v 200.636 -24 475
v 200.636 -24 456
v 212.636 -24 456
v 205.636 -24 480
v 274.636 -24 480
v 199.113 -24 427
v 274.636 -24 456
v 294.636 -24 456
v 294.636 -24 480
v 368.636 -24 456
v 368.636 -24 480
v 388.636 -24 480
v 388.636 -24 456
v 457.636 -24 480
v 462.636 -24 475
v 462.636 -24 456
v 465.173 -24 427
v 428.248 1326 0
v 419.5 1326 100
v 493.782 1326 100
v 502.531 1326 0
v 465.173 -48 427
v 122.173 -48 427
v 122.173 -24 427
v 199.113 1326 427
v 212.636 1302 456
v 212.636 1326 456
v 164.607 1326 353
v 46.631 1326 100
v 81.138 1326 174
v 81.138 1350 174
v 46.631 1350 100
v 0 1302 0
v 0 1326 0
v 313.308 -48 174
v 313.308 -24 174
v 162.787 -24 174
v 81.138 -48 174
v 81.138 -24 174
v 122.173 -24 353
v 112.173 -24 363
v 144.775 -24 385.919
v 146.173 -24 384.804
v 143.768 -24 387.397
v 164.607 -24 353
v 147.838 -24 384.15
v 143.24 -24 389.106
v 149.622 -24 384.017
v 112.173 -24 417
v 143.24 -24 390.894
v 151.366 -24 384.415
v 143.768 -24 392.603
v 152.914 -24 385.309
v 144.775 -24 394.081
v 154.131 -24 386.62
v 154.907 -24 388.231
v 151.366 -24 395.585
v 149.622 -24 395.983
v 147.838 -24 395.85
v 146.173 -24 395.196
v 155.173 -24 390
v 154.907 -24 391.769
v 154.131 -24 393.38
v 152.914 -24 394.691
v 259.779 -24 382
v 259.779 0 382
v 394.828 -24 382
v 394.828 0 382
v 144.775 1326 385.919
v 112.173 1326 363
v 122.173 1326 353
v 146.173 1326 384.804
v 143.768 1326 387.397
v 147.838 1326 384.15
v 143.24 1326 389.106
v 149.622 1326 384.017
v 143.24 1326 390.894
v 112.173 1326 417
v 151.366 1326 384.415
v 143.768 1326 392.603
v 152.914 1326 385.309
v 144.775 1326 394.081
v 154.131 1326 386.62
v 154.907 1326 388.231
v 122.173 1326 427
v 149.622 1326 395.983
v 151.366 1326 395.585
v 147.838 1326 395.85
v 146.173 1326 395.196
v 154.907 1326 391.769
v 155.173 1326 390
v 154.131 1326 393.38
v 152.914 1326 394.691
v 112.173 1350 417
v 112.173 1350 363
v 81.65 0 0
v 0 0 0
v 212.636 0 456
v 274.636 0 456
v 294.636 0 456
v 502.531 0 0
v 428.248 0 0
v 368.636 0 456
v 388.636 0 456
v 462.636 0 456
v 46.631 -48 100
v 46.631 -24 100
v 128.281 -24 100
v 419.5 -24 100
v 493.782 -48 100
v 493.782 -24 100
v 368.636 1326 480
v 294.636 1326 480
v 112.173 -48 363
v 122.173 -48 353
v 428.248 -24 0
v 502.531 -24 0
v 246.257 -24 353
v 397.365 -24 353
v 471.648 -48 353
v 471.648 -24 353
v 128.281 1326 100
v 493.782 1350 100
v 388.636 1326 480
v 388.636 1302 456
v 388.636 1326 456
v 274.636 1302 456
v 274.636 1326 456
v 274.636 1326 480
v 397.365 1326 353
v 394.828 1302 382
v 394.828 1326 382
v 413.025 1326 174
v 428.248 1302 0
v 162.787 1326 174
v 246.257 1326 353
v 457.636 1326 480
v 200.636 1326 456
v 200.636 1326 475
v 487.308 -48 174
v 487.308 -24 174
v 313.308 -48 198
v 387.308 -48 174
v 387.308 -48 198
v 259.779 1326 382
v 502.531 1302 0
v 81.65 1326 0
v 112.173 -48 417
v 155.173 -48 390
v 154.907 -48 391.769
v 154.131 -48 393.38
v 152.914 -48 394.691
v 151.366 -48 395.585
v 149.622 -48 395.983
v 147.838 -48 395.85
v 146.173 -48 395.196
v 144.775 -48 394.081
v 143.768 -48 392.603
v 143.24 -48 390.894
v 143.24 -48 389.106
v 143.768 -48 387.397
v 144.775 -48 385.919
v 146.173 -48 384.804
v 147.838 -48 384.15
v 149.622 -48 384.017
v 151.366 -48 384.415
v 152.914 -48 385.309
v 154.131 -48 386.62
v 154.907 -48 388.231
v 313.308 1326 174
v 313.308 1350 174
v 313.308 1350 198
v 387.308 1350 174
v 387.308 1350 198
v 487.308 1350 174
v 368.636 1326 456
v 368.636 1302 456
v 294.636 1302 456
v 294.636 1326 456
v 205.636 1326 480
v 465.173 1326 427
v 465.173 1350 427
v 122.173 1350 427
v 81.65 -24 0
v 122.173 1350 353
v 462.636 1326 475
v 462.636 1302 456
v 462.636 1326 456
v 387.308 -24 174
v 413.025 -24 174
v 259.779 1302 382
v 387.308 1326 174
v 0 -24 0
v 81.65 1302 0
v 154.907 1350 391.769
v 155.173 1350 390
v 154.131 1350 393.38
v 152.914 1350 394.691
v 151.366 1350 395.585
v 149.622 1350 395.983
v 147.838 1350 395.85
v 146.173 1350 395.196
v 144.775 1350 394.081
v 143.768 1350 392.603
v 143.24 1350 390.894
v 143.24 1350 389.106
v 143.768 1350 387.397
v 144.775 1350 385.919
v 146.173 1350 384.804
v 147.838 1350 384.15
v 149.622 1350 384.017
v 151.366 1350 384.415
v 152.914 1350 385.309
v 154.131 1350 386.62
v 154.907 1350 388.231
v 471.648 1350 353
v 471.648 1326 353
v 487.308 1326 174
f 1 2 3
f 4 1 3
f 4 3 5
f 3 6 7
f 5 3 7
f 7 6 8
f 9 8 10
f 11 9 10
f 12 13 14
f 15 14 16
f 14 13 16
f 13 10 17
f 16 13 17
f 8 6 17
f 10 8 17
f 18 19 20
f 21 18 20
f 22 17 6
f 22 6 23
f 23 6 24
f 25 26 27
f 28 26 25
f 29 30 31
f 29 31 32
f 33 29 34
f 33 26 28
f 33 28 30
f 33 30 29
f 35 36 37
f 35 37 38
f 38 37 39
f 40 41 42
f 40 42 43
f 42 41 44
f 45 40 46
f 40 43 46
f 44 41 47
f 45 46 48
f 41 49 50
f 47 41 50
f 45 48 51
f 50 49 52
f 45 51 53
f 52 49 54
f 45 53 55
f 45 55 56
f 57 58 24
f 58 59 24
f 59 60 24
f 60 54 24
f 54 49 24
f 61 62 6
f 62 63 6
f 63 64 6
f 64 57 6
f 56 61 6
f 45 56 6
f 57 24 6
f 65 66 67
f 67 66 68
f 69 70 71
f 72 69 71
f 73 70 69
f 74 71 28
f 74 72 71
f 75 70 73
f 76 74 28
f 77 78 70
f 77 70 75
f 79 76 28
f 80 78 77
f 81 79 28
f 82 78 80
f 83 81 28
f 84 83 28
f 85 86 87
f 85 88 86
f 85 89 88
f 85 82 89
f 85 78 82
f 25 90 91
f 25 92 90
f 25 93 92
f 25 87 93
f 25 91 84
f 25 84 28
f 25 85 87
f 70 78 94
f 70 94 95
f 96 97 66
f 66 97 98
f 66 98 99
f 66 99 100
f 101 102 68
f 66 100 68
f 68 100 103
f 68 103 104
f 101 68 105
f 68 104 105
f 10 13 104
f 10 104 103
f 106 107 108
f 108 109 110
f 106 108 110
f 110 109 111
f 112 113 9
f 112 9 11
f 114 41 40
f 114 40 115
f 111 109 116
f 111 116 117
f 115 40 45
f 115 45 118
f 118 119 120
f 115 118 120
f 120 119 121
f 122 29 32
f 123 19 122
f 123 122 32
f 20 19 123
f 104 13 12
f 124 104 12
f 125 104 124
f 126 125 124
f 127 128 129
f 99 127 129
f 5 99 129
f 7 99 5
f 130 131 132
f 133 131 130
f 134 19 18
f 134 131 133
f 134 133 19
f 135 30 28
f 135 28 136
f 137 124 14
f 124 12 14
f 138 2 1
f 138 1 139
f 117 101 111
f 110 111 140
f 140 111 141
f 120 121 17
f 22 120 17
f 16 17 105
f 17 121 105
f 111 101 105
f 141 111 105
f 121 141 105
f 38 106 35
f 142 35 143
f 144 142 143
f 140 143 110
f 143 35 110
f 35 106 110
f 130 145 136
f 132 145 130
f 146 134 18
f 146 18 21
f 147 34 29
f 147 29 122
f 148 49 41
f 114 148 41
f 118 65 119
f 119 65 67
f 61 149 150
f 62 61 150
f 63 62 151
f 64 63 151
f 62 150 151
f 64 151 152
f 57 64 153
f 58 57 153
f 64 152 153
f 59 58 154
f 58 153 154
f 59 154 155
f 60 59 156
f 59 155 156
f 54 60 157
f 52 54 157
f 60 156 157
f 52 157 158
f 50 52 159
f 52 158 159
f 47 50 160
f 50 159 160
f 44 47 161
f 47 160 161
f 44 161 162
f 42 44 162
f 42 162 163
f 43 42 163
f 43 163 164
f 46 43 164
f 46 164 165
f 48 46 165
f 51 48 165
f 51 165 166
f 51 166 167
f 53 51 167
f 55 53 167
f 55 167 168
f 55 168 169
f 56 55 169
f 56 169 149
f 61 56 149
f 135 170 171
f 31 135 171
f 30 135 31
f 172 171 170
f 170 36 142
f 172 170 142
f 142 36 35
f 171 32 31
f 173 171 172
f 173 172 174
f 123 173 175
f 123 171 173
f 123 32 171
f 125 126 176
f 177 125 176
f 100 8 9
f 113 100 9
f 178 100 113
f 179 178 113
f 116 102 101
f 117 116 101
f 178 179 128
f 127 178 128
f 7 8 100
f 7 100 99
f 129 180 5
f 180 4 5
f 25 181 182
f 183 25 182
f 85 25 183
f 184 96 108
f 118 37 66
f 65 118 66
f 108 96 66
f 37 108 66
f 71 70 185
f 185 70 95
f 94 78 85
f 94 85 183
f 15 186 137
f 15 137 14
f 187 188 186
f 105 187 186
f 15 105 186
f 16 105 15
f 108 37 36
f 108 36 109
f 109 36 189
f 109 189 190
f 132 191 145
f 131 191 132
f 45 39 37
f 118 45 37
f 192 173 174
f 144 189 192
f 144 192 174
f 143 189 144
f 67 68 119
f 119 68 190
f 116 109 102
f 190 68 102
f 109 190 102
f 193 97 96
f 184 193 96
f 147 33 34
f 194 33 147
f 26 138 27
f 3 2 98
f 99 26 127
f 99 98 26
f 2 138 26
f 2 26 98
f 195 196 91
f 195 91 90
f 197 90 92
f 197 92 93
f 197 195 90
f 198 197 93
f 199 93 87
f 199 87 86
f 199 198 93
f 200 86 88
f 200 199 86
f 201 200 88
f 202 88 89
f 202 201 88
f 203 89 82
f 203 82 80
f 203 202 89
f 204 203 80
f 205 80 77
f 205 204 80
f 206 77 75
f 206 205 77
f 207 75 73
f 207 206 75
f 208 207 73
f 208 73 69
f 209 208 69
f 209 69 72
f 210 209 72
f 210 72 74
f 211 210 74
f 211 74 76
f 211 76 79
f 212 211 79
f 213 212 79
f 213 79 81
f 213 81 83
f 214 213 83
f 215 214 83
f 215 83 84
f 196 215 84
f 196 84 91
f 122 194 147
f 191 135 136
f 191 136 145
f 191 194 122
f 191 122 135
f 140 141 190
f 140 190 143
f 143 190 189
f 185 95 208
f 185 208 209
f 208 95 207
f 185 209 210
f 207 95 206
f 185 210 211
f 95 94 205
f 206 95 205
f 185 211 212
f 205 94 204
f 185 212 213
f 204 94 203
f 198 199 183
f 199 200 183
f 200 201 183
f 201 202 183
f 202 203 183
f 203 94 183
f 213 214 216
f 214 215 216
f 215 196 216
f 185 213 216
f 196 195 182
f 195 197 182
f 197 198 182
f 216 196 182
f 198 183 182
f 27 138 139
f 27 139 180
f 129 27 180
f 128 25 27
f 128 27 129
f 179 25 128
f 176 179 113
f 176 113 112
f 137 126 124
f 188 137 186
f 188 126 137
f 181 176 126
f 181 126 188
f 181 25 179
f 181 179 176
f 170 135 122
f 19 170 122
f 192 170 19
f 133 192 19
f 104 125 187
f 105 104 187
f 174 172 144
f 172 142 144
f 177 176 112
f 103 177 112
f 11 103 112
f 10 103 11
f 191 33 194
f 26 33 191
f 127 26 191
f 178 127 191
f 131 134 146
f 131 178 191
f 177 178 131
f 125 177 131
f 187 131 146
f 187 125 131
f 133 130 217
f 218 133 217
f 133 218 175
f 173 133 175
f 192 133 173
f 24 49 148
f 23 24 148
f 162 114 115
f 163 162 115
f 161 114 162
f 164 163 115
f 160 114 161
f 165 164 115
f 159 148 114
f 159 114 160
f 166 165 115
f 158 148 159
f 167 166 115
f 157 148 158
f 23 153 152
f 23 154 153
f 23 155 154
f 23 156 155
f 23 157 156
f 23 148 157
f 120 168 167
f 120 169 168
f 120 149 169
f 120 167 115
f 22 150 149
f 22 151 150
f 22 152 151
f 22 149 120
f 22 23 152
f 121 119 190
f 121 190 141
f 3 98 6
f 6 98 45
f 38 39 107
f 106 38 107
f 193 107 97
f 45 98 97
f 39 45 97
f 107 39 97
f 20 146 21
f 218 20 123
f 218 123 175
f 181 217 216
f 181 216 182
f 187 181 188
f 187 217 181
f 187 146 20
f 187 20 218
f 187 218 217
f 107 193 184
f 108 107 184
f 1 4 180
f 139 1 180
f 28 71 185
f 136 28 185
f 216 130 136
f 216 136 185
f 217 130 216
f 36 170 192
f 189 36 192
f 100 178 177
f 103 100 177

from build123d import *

# Parameters (mm, degrees)
F2_DEPTH  = 24
F4_DEPTH  = 24
F5_W      = 74
F5_H      = 699
F6_DEPTH  = 24
F7_R      = 6
F8_DEPTH  = 699.001
F9_SIZE   = 10
F10_W     = 74
F10_H     = 651
F10_H_2   = 24
F10_W_2   = 62
F11_DEPTH = 24
F12_SIZE  = 5


with BuildPart() as f2:
    # F1 (on Front) → F2 (new body)
    with BuildSketch(Plane.XZ):
        Polygon((212.6362921187, 456), (0, 0), (81.6499660032, 0), (259.7794914184, 382), (394.8277852414, 382), (428.2484547083, 0), (502.5311226865, 0), (462.6362921187, 456), align=None)
    extrude(amount=F2_DEPTH)

    # F3 (on face) → F4 (join)
    with BuildSketch(Plane.XZ.offset(24)):
        Polygon((164.6066033287, 353), (199.1133700322, 427), (112.1734633609, 427), (112.1734633609, 353), align=None)
        Polygon((471.6476244618, 353), (465.1734633609, 427), (199.1133700322, 427), (164.6066033287, 353), (246.2565693319, 353), (259.7794914184, 382), (394.8277852414, 382), (397.3649564836, 353), align=None)
        Polygon((419.4995883557, 100), (413.0254272548, 174), (162.7874985222, 174), (128.2807318187, 100), align=None)
        Polygon((162.7874985222, 174), (81.137532519, 174), (46.6307658155, 100), (128.2807318187, 100), align=None)
        Polygon((493.7822563339, 100), (487.308095233, 174), (413.0254272548, 174), (419.4995883557, 100), align=None)
        Polygon((246.2565693319, 353), (397.3649564836, 353), (394.8277852414, 382), (259.7794914184, 382), align=None)
    extrude(amount=F4_DEPTH)

    # F5 (on face) → F6 (join)
    with BuildSketch(Plane.XY.offset(174)):
        with Locations((350.308095233, 301.5)):
            Rectangle(F5_W, F5_H)
    extrude(amount=F6_DEPTH)

    # F7 (on face) → F8 (cut, through all)
    with BuildSketch(Plane.XZ.offset(48)):
        with Locations((149.1734633609, 390)):
            Circle(F7_R)
    extrude(amount=-F8_DEPTH, mode=Mode.SUBTRACT)

    # F9
    f9_edges = [f2.edges().sort_by_distance(p)[0] for p in [
        (112.173463, -36, 427),
        (112.173463, -36, 353),
    ]]
    chamfer(f9_edges, length=F9_SIZE)

    # F10 (on face) → F11 (join)
    with BuildSketch(Plane.XY.offset(456)):
        with Locations((425.6362921187, 325.5)):
            Rectangle(F10_W, F10_H)
        with Locations((331.6362921187, 325.5)):
            Rectangle(F10_W, F10_H)
        with Locations((425.6362921187, -12)):
            Rectangle(F10_W, F10_H_2)
        with Locations((331.6362921187, -12)):
            Rectangle(F10_W, F10_H_2)
        with Locations((243.6362921187, -12)):
            Rectangle(F10_W_2, F10_H_2)
        Polygon((212.6362921187, 0), (274.6362921187, 0), (274.6362921187, 651), (200.6362921187, 651), (200.6362921187, -24), (212.6362921187, -24), align=None)
    extrude(amount=F11_DEPTH)

    # F12
    f12_edges = [f2.edges().sort_by_distance(p)[0] for p in [
        (200.636292, 313.5, 480),
        (462.636292, 313.5, 480),
    ]]
    chamfer(f12_edges, length=F12_SIZE)

    # F13: F2 across face


with BuildPart() as f2_1:
    add(f2.part)
    add(f2.part.mirror(Plane(origin=(350.308095233, 651, 186), x_dir=(-1, 0, 0), z_dir=(0, 1, 0))))


solid = f2_1.part
